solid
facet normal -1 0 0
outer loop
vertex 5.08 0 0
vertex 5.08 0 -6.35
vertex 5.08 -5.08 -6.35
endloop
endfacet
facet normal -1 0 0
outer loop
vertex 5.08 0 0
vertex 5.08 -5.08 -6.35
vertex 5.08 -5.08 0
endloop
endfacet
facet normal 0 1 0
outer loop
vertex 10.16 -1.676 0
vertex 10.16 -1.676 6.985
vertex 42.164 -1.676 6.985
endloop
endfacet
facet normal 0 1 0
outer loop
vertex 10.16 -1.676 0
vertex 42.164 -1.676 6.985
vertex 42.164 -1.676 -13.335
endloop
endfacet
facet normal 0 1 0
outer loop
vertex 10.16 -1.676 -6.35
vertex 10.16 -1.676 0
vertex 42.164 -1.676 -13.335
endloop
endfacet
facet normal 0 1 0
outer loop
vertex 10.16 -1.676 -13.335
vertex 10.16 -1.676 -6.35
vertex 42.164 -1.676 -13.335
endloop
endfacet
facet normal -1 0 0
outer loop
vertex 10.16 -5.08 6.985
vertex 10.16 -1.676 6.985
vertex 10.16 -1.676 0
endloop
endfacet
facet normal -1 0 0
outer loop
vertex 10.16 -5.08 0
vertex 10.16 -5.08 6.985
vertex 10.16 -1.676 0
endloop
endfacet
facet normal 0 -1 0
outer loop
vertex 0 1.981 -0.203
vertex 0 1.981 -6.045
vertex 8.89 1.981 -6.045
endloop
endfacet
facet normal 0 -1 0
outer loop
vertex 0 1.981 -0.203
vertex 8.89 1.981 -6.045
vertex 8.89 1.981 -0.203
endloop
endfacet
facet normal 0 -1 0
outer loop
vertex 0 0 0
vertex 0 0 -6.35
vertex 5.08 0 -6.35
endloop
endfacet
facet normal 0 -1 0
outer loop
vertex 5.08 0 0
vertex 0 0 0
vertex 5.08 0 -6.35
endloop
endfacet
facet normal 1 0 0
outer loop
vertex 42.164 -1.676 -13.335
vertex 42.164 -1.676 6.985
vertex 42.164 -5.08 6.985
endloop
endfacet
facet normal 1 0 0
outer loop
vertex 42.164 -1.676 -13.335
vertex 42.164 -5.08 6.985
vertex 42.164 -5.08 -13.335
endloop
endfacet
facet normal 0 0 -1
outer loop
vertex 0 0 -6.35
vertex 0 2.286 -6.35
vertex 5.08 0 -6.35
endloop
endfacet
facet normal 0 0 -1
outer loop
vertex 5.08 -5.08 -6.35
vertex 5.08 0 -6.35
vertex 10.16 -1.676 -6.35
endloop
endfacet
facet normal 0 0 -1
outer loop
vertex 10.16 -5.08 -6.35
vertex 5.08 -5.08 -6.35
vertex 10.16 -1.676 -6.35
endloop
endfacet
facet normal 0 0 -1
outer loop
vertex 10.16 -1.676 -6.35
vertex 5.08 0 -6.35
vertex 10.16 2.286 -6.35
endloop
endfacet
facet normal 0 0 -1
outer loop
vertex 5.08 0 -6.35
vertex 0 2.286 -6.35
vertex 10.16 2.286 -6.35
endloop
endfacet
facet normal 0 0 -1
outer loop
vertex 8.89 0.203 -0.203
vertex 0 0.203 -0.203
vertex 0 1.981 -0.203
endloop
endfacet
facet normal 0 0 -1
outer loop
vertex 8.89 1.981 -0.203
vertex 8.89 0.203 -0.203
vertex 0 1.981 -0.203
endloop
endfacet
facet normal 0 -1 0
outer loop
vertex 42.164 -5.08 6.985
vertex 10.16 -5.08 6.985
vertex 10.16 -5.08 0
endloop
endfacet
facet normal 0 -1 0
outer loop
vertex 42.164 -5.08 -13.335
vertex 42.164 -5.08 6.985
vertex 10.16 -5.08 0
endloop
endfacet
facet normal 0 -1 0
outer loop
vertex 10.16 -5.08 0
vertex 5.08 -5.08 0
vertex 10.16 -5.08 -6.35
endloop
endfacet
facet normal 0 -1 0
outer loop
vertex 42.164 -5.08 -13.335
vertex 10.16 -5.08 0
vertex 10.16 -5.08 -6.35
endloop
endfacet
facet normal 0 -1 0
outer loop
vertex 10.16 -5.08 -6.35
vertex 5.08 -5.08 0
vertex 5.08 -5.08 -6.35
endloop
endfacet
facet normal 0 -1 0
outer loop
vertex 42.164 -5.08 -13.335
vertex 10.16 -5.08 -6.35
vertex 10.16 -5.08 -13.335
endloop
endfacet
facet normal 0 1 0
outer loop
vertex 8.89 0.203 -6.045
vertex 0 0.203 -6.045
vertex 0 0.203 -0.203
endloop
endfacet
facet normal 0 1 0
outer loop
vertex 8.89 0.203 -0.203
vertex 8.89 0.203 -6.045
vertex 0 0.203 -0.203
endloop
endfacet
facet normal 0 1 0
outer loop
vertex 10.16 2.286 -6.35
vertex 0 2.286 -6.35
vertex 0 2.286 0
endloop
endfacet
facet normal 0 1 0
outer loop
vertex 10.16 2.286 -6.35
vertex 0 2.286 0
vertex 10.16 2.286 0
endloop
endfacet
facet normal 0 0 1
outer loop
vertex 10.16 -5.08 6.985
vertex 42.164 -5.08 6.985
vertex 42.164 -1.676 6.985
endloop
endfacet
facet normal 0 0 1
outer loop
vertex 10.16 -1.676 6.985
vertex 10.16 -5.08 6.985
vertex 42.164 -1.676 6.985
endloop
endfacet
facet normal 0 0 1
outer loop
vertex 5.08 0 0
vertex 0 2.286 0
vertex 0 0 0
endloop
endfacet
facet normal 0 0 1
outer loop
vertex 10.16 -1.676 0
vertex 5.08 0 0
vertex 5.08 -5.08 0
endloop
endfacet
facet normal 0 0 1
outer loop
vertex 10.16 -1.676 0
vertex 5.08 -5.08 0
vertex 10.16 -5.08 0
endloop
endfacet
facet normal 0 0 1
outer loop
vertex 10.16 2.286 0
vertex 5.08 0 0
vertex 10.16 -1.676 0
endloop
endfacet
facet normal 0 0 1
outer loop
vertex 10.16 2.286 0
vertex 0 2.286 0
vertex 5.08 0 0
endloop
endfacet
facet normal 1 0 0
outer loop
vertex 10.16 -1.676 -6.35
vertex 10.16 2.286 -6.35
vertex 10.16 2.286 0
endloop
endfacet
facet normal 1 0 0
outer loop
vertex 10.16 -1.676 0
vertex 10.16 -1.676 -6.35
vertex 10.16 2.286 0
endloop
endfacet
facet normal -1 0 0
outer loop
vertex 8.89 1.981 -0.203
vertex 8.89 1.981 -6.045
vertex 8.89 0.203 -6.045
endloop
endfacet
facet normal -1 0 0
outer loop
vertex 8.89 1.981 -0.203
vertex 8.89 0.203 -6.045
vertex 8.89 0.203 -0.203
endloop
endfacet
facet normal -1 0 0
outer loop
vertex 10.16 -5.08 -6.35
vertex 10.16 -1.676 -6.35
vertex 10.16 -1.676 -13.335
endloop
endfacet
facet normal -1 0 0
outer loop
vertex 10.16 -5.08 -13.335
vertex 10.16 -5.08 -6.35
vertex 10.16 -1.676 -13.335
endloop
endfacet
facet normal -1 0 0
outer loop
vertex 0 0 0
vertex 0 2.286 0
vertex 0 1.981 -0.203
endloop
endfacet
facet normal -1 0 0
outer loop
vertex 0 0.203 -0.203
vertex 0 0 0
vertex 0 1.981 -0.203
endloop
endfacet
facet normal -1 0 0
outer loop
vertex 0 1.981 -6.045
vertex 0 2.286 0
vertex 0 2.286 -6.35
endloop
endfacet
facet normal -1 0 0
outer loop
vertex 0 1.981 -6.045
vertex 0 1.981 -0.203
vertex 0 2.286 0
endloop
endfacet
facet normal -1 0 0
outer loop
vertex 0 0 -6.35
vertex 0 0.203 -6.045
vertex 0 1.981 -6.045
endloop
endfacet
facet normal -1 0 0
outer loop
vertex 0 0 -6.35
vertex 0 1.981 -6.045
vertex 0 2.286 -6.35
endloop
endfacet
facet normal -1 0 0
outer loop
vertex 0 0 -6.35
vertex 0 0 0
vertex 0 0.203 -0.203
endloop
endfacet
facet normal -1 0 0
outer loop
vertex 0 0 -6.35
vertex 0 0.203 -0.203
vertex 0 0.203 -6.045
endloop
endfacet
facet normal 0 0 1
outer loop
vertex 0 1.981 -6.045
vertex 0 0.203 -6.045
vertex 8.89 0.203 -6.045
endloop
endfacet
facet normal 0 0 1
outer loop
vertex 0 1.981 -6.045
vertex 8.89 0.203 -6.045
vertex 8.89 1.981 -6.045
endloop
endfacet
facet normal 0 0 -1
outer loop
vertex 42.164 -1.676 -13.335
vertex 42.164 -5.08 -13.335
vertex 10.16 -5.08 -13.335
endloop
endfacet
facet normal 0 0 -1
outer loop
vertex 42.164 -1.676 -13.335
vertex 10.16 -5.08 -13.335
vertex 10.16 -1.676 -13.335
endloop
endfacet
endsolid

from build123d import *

# Parameters (mm, degrees)
SKETCH1_W           = 10.16
SKETCH1_H           = 6.35
BOSS_EXTRUDE1_DEPTH = 2.286
SKETCH2_W           = 5.842
SKETCH2_H           = 1.778
CUT_EXTRUDE1_DEPTH  = 8.89
SKETCH3_W           = 5.08
SKETCH3_H           = 6.35
BOSS_EXTRUDE2_DEPTH = 5.08
SKETCH4_W           = 20.32
SKETCH4_H           = 3.4036
BOSS_EXTRUDE3_DEPTH = 32.004


with BuildPart() as part:
    # Sketch1 → Boss-Extrude1 (new body)
    with BuildSketch(Plane(origin=(0, 0, 0), x_dir=(1, 0, 0), z_dir=(0, 1, 0))):
        with Locations((5.08, 3.175)):
            Rectangle(SKETCH1_W, SKETCH1_H)
    extrude(amount=BOSS_EXTRUDE1_DEPTH)

    # Sketch2 → Cut-Extrude1 (cut)
    with BuildSketch(Plane.ZY):
        with Locations((-3.1242, 1.0922)):
            Rectangle(SKETCH2_W, SKETCH2_H)
    extrude(amount=-CUT_EXTRUDE1_DEPTH, mode=Mode.SUBTRACT)

    # Sketch3 → Boss-Extrude2 (add)
    with BuildSketch(Plane.XZ):
        with Locations((7.62, -3.175)):
            Rectangle(SKETCH3_W, SKETCH3_H)
    extrude(amount=BOSS_EXTRUDE2_DEPTH)

    # Sketch4 → Boss-Extrude3 (add)
    with BuildSketch(Plane(origin=(10.16, 0, 0), x_dir=(0, 0, -1), z_dir=(1, 0, 0))):
        with Locations((3.175, -3.3782)):
            Rectangle(SKETCH4_W, SKETCH4_H)
    extrude(amount=BOSS_EXTRUDE3_DEPTH)


solid = part.part
